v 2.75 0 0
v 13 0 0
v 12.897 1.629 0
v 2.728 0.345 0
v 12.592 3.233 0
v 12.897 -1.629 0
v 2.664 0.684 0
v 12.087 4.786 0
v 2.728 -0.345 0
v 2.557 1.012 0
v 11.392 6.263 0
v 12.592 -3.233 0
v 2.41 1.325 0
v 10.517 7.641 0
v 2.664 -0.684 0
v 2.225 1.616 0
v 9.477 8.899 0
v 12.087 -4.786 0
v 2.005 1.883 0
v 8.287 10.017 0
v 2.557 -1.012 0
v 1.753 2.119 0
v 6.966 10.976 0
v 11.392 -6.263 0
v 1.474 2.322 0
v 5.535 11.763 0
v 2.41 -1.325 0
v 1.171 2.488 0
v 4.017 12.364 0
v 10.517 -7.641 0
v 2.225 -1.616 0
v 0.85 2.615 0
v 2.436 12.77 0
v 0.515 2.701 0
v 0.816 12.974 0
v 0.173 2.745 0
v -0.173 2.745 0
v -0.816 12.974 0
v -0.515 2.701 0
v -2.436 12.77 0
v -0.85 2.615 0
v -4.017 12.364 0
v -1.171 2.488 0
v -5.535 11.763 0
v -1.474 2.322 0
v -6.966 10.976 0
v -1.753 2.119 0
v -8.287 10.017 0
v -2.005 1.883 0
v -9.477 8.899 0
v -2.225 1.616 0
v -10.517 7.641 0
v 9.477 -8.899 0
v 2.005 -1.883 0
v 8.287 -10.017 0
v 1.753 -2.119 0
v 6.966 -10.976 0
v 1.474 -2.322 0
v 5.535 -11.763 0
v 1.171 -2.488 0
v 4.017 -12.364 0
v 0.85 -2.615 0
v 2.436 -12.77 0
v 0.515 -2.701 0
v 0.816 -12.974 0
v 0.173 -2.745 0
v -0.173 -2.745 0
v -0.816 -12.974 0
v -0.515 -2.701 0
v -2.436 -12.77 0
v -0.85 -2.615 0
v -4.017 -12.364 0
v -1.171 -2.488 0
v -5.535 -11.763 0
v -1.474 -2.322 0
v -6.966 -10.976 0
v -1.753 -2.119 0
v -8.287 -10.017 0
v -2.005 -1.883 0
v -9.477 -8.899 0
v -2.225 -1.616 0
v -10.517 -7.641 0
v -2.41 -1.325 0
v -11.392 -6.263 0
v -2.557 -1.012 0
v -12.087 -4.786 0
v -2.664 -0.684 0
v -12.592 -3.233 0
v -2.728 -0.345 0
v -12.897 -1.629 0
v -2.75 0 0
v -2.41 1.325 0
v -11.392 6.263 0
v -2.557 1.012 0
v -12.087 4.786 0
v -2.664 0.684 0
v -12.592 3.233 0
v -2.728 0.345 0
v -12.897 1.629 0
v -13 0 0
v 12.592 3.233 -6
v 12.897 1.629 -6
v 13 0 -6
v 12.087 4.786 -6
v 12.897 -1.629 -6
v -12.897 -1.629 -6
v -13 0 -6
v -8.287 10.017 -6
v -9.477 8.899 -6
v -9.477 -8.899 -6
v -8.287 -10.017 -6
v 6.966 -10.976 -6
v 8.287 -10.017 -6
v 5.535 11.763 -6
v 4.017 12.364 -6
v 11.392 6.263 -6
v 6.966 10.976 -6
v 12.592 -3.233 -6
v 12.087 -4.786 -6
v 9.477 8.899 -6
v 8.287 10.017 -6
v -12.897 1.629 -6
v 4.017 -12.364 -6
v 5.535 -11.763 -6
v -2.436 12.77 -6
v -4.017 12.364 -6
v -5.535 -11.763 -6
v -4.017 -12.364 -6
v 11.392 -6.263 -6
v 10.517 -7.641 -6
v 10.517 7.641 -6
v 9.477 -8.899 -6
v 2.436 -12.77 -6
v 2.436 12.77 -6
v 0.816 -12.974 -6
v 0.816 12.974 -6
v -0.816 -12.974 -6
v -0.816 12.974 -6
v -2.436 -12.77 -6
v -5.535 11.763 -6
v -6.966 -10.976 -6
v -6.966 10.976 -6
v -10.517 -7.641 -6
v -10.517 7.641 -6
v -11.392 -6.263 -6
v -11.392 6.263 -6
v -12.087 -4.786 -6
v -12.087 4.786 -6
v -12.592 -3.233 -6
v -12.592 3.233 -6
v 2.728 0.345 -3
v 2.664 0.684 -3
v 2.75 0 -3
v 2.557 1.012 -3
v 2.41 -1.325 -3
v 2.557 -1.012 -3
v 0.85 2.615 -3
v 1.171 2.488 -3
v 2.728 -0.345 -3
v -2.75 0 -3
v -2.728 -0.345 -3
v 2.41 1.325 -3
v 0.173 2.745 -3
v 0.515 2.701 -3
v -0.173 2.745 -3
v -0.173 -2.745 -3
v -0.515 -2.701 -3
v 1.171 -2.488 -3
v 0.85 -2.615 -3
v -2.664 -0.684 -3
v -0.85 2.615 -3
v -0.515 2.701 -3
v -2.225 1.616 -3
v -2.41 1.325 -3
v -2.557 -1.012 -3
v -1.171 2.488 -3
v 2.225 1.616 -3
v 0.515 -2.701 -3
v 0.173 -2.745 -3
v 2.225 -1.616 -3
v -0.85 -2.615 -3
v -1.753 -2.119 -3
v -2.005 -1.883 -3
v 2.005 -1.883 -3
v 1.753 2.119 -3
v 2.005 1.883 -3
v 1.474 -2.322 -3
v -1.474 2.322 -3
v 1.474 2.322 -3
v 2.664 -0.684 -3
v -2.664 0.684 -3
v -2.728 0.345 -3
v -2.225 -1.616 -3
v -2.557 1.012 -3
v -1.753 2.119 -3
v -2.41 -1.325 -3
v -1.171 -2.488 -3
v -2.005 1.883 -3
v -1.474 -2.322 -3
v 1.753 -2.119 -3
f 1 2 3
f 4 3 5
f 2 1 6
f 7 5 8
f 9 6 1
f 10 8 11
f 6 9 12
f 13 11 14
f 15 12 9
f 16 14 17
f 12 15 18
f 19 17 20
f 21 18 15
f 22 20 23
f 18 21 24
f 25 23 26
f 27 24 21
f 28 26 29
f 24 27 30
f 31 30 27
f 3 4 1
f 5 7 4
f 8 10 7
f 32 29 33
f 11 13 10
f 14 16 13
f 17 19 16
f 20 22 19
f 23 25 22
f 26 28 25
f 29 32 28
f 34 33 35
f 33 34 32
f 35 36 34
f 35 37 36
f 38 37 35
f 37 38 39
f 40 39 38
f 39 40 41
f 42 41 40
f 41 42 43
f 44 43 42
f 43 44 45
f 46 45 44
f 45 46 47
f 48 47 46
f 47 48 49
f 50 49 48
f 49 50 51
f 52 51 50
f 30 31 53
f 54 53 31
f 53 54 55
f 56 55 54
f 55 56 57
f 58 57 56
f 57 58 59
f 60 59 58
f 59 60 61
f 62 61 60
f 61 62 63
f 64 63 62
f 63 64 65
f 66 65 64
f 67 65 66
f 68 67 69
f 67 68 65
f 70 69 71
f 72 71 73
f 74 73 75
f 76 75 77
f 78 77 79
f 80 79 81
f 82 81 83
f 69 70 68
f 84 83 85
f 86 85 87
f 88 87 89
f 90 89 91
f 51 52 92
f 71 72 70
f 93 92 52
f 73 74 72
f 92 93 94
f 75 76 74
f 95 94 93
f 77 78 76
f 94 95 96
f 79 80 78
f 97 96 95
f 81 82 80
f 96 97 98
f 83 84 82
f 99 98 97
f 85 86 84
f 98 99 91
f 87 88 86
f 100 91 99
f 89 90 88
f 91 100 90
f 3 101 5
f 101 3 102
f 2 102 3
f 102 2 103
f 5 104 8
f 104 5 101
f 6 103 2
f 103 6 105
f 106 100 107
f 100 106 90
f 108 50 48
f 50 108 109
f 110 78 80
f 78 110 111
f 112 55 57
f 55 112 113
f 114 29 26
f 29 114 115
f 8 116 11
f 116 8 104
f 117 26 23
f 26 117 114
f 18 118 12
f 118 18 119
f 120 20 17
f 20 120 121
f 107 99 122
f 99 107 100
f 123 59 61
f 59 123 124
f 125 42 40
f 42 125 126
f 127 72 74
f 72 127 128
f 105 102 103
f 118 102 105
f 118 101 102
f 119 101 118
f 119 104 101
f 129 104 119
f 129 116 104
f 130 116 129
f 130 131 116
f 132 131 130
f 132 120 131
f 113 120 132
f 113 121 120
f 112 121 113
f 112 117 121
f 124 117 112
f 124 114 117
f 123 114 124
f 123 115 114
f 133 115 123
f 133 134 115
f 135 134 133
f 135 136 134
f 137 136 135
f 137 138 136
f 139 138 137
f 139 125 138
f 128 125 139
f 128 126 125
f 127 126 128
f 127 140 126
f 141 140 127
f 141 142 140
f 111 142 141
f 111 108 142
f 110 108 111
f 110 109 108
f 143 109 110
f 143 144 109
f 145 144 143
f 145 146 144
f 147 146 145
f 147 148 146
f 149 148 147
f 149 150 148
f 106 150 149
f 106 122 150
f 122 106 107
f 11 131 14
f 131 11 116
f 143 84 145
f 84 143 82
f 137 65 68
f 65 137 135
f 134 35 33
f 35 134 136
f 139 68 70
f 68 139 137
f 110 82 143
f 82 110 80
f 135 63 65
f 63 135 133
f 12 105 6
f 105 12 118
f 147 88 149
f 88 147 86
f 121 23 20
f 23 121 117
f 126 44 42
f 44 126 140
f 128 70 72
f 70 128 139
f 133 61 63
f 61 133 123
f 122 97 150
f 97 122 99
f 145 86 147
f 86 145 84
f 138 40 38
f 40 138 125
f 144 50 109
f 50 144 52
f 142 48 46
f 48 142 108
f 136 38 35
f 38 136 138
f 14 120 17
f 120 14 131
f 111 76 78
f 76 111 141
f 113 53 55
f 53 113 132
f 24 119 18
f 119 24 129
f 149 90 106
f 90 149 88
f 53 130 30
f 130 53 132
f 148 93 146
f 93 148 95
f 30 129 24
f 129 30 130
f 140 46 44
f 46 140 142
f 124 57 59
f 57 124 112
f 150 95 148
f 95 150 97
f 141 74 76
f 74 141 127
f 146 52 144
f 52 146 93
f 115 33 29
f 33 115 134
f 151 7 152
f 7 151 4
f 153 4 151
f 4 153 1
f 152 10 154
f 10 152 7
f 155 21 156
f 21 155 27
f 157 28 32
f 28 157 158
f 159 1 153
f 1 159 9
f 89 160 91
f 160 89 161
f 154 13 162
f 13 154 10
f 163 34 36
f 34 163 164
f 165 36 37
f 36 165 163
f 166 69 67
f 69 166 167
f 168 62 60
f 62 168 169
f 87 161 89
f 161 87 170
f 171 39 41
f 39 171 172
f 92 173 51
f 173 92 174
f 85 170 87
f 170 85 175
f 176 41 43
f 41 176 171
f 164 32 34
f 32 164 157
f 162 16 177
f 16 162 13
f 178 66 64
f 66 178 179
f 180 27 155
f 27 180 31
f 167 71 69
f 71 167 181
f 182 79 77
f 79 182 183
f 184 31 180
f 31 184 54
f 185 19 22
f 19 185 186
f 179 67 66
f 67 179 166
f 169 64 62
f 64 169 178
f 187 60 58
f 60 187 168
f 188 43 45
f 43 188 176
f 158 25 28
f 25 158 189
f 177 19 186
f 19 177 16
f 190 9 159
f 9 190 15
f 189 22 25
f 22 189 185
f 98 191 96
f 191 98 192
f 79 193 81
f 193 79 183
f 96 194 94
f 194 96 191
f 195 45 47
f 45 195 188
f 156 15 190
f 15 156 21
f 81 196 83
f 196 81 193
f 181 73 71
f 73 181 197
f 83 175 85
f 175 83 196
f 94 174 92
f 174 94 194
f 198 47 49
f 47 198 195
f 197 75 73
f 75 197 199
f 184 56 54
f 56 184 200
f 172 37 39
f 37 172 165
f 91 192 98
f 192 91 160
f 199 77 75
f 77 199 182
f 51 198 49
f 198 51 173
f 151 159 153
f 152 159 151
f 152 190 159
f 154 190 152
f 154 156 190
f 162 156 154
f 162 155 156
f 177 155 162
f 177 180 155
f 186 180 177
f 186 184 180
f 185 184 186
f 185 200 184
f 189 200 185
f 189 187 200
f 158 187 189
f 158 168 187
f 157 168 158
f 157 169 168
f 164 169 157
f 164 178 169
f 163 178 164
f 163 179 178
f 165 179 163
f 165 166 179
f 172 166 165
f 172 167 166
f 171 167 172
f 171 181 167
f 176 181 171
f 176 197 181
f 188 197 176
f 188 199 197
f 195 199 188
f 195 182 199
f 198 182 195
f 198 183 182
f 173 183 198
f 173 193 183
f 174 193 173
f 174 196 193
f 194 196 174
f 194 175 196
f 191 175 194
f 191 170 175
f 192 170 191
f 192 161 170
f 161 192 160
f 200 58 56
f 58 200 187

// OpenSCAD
$fn = 50;


difference() {
	union() {
		translate(v = [0, 0, -3.0000000000]) {
			cylinder(h = 3, r = 7.0000000000);
		}
		translate(v = [0, 0, -6.0000000000]) {
			cylinder(h = 6, r = 13.0000000000);
		}
	}
	union() {
		#translate(v = [0, 0, -3]) {
			cylinder(h = 3, r = 2.7500000000);
		}
	}
}
